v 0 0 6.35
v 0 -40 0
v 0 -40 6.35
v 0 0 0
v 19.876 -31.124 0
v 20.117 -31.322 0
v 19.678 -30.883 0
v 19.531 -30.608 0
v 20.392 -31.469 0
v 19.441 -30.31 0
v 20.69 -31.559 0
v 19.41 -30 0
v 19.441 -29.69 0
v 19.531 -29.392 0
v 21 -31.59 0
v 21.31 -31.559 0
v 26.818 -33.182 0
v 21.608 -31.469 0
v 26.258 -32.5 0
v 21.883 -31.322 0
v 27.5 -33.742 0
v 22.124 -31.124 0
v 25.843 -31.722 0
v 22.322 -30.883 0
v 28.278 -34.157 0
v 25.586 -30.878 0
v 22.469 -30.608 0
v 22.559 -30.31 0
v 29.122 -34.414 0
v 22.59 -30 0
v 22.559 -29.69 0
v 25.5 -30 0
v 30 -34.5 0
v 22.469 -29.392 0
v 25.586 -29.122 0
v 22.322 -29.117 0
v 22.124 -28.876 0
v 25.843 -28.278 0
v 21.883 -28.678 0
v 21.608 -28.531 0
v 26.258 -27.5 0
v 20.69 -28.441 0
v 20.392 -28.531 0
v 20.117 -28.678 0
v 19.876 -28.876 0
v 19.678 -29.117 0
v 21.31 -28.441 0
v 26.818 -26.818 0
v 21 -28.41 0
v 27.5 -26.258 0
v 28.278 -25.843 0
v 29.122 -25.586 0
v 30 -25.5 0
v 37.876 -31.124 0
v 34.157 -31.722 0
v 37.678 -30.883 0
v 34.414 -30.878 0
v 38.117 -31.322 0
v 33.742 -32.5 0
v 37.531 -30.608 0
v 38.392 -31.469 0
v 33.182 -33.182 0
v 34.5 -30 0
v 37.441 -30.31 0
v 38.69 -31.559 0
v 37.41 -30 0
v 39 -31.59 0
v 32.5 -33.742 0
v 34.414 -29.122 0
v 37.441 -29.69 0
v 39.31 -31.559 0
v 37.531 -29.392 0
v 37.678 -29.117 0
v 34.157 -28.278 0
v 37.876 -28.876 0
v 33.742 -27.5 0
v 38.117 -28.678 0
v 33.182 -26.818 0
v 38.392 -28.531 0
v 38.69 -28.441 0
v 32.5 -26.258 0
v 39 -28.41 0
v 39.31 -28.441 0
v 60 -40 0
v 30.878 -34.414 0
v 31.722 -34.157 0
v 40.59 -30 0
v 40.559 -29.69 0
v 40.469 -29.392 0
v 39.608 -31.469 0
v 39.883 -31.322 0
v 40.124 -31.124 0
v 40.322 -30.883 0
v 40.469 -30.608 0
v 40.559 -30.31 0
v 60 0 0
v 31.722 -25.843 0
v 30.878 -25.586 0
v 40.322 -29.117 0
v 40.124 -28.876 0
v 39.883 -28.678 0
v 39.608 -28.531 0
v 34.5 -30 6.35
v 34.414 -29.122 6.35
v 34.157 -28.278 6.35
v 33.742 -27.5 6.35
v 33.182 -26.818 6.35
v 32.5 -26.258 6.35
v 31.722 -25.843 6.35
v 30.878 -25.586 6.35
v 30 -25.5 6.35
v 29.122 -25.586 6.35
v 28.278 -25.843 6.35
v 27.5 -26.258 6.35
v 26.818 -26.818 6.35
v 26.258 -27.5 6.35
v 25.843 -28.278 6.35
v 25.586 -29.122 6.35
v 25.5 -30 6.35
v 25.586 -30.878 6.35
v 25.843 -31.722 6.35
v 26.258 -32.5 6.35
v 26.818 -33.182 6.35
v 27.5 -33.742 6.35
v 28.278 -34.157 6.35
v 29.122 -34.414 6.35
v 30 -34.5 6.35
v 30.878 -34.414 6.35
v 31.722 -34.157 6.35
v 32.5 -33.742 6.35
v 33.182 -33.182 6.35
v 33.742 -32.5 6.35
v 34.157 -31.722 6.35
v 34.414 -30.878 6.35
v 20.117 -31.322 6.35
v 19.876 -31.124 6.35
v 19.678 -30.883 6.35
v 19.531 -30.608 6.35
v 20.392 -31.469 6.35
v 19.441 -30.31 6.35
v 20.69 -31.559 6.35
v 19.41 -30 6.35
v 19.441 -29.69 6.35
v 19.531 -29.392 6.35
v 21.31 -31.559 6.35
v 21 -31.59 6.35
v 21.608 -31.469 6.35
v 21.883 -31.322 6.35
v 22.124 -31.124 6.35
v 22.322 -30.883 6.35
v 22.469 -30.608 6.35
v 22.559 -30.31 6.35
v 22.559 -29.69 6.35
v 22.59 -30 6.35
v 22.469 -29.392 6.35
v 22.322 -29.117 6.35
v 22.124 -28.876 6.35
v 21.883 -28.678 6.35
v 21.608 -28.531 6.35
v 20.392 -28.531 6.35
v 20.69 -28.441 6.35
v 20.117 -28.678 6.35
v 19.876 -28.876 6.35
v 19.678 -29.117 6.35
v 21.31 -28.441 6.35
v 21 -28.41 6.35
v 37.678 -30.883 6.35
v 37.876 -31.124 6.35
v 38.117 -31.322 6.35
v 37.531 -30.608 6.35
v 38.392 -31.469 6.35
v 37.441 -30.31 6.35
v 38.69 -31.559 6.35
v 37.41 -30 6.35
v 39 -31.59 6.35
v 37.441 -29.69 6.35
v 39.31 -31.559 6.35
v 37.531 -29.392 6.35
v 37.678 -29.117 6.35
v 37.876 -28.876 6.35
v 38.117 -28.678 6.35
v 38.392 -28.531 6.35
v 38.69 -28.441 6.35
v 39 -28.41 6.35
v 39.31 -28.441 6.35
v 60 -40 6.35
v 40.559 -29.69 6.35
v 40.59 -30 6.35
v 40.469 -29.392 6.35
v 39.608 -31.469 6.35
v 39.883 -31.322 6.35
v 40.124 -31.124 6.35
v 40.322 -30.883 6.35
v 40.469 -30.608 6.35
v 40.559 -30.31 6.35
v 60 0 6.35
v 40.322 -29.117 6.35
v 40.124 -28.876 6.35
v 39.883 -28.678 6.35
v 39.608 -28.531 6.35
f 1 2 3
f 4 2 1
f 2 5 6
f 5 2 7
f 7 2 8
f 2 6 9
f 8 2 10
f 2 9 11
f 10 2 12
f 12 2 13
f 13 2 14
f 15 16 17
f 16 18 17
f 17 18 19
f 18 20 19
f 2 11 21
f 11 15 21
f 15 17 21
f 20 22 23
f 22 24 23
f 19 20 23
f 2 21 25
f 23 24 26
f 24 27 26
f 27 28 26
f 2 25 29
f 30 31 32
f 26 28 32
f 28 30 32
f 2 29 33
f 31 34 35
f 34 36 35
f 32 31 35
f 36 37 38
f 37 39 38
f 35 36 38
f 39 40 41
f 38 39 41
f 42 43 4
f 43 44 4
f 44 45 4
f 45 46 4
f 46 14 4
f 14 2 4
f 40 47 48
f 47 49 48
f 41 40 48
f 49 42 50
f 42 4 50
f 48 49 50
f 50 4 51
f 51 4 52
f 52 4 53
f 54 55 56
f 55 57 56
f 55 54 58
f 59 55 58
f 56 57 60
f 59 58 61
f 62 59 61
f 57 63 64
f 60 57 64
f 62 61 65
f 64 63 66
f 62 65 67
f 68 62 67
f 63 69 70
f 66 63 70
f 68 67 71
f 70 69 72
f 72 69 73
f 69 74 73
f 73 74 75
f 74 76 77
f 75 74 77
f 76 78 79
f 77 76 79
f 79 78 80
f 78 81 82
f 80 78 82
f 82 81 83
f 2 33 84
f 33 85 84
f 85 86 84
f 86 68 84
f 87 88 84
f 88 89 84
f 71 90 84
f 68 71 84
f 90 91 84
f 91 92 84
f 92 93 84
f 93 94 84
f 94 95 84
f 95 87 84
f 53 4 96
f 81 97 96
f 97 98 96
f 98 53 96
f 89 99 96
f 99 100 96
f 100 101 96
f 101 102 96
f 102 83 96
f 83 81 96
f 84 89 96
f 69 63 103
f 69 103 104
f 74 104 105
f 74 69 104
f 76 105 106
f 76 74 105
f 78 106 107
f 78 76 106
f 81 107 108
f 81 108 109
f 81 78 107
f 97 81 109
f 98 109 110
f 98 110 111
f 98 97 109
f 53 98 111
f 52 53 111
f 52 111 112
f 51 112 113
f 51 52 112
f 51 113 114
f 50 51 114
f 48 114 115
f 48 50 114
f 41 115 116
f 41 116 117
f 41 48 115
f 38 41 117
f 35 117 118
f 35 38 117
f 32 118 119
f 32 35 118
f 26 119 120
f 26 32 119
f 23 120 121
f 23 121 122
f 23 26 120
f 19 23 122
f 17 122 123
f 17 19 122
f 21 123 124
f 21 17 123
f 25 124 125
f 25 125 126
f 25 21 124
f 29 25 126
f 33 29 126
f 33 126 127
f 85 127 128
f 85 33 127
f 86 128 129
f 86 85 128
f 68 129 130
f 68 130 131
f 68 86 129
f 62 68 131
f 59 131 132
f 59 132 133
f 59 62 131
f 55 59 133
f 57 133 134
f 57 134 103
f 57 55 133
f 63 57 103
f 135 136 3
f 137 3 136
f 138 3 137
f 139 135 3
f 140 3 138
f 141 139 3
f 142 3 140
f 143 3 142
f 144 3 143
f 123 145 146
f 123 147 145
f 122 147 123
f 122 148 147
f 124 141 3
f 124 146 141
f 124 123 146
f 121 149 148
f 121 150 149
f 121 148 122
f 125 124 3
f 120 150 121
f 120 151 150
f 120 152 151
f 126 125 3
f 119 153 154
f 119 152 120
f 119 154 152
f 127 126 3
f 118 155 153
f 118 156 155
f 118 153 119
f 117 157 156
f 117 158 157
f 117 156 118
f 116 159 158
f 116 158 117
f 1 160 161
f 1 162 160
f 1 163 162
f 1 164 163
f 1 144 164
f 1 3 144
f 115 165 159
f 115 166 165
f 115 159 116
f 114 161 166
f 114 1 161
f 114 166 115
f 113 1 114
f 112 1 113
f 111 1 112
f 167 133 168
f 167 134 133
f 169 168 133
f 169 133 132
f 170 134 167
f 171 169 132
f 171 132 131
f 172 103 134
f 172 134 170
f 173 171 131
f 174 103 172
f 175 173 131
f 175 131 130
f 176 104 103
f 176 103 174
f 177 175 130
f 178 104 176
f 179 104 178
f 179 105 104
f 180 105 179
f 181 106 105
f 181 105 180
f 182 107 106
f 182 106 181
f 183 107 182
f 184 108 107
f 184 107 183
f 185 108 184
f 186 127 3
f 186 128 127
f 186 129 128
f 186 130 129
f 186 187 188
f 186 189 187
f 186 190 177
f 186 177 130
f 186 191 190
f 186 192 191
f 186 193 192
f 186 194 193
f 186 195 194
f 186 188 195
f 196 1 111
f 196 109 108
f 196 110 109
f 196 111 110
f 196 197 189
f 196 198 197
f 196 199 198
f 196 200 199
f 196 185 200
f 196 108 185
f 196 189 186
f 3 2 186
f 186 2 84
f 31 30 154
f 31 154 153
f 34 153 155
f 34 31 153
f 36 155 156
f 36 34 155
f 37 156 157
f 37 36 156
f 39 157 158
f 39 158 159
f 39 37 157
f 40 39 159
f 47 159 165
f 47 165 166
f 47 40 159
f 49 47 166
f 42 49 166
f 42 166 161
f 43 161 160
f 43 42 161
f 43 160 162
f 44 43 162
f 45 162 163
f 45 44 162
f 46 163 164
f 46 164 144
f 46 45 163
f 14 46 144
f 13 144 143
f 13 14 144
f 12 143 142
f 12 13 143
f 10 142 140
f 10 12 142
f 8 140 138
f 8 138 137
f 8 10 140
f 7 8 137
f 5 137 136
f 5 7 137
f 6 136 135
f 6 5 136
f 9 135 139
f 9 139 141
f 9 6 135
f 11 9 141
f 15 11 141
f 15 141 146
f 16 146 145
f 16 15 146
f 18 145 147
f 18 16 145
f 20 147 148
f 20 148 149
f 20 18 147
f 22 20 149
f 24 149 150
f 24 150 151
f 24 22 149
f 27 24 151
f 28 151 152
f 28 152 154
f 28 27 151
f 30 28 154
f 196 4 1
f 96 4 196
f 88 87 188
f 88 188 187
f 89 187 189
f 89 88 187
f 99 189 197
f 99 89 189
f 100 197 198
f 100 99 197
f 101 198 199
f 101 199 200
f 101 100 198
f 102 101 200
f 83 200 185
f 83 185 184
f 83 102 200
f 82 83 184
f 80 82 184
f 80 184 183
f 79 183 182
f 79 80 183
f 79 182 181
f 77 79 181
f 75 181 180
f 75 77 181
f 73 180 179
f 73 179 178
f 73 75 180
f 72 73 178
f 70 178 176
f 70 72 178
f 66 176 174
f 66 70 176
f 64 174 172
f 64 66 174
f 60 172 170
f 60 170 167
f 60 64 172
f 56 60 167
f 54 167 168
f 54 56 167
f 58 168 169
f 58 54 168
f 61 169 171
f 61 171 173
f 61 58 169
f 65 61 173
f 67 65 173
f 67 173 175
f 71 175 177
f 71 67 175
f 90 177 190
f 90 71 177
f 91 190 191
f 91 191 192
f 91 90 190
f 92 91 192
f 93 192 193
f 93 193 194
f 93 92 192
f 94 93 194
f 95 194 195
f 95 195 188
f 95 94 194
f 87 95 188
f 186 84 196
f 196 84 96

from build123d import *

# Parameters (mm, degrees)
SKETCH1_W           = 60
SKETCH1_H           = 40
SKETCH1_W_2         = 25
SKETCH1_H_2         = 15
SKETCH1_R           = 1.59
SKETCH1_R_2         = 4.5
BOSS_EXTRUDE1_DEPTH = 6.35


with BuildPart() as part:
    # Sketch1 → Boss-Extrude1 (new body)
    # profile 1 of 2: a face of its own
    with BuildSketch(Plane.XY):
        with Locations((30, -20)):
            Rectangle(SKETCH1_W, SKETCH1_H)
        with Locations((30, -30)):
            Rectangle(SKETCH1_W_2, SKETCH1_H_2, mode=Mode.SUBTRACT)
    # profile 2 of 2: a face of its own
    with BuildSketch(Plane.XY):
        with Locations((30, -30)):
            Rectangle(SKETCH1_W_2, SKETCH1_H_2)
        with Locations((39, -30)):
            Circle(SKETCH1_R, mode=Mode.SUBTRACT)
        with Locations((21, -30)):
            Circle(SKETCH1_R, mode=Mode.SUBTRACT)
        with Locations((30, -30)):
            Circle(SKETCH1_R_2, mode=Mode.SUBTRACT)
    extrude(amount=BOSS_EXTRUDE1_DEPTH)


solid = part.part
